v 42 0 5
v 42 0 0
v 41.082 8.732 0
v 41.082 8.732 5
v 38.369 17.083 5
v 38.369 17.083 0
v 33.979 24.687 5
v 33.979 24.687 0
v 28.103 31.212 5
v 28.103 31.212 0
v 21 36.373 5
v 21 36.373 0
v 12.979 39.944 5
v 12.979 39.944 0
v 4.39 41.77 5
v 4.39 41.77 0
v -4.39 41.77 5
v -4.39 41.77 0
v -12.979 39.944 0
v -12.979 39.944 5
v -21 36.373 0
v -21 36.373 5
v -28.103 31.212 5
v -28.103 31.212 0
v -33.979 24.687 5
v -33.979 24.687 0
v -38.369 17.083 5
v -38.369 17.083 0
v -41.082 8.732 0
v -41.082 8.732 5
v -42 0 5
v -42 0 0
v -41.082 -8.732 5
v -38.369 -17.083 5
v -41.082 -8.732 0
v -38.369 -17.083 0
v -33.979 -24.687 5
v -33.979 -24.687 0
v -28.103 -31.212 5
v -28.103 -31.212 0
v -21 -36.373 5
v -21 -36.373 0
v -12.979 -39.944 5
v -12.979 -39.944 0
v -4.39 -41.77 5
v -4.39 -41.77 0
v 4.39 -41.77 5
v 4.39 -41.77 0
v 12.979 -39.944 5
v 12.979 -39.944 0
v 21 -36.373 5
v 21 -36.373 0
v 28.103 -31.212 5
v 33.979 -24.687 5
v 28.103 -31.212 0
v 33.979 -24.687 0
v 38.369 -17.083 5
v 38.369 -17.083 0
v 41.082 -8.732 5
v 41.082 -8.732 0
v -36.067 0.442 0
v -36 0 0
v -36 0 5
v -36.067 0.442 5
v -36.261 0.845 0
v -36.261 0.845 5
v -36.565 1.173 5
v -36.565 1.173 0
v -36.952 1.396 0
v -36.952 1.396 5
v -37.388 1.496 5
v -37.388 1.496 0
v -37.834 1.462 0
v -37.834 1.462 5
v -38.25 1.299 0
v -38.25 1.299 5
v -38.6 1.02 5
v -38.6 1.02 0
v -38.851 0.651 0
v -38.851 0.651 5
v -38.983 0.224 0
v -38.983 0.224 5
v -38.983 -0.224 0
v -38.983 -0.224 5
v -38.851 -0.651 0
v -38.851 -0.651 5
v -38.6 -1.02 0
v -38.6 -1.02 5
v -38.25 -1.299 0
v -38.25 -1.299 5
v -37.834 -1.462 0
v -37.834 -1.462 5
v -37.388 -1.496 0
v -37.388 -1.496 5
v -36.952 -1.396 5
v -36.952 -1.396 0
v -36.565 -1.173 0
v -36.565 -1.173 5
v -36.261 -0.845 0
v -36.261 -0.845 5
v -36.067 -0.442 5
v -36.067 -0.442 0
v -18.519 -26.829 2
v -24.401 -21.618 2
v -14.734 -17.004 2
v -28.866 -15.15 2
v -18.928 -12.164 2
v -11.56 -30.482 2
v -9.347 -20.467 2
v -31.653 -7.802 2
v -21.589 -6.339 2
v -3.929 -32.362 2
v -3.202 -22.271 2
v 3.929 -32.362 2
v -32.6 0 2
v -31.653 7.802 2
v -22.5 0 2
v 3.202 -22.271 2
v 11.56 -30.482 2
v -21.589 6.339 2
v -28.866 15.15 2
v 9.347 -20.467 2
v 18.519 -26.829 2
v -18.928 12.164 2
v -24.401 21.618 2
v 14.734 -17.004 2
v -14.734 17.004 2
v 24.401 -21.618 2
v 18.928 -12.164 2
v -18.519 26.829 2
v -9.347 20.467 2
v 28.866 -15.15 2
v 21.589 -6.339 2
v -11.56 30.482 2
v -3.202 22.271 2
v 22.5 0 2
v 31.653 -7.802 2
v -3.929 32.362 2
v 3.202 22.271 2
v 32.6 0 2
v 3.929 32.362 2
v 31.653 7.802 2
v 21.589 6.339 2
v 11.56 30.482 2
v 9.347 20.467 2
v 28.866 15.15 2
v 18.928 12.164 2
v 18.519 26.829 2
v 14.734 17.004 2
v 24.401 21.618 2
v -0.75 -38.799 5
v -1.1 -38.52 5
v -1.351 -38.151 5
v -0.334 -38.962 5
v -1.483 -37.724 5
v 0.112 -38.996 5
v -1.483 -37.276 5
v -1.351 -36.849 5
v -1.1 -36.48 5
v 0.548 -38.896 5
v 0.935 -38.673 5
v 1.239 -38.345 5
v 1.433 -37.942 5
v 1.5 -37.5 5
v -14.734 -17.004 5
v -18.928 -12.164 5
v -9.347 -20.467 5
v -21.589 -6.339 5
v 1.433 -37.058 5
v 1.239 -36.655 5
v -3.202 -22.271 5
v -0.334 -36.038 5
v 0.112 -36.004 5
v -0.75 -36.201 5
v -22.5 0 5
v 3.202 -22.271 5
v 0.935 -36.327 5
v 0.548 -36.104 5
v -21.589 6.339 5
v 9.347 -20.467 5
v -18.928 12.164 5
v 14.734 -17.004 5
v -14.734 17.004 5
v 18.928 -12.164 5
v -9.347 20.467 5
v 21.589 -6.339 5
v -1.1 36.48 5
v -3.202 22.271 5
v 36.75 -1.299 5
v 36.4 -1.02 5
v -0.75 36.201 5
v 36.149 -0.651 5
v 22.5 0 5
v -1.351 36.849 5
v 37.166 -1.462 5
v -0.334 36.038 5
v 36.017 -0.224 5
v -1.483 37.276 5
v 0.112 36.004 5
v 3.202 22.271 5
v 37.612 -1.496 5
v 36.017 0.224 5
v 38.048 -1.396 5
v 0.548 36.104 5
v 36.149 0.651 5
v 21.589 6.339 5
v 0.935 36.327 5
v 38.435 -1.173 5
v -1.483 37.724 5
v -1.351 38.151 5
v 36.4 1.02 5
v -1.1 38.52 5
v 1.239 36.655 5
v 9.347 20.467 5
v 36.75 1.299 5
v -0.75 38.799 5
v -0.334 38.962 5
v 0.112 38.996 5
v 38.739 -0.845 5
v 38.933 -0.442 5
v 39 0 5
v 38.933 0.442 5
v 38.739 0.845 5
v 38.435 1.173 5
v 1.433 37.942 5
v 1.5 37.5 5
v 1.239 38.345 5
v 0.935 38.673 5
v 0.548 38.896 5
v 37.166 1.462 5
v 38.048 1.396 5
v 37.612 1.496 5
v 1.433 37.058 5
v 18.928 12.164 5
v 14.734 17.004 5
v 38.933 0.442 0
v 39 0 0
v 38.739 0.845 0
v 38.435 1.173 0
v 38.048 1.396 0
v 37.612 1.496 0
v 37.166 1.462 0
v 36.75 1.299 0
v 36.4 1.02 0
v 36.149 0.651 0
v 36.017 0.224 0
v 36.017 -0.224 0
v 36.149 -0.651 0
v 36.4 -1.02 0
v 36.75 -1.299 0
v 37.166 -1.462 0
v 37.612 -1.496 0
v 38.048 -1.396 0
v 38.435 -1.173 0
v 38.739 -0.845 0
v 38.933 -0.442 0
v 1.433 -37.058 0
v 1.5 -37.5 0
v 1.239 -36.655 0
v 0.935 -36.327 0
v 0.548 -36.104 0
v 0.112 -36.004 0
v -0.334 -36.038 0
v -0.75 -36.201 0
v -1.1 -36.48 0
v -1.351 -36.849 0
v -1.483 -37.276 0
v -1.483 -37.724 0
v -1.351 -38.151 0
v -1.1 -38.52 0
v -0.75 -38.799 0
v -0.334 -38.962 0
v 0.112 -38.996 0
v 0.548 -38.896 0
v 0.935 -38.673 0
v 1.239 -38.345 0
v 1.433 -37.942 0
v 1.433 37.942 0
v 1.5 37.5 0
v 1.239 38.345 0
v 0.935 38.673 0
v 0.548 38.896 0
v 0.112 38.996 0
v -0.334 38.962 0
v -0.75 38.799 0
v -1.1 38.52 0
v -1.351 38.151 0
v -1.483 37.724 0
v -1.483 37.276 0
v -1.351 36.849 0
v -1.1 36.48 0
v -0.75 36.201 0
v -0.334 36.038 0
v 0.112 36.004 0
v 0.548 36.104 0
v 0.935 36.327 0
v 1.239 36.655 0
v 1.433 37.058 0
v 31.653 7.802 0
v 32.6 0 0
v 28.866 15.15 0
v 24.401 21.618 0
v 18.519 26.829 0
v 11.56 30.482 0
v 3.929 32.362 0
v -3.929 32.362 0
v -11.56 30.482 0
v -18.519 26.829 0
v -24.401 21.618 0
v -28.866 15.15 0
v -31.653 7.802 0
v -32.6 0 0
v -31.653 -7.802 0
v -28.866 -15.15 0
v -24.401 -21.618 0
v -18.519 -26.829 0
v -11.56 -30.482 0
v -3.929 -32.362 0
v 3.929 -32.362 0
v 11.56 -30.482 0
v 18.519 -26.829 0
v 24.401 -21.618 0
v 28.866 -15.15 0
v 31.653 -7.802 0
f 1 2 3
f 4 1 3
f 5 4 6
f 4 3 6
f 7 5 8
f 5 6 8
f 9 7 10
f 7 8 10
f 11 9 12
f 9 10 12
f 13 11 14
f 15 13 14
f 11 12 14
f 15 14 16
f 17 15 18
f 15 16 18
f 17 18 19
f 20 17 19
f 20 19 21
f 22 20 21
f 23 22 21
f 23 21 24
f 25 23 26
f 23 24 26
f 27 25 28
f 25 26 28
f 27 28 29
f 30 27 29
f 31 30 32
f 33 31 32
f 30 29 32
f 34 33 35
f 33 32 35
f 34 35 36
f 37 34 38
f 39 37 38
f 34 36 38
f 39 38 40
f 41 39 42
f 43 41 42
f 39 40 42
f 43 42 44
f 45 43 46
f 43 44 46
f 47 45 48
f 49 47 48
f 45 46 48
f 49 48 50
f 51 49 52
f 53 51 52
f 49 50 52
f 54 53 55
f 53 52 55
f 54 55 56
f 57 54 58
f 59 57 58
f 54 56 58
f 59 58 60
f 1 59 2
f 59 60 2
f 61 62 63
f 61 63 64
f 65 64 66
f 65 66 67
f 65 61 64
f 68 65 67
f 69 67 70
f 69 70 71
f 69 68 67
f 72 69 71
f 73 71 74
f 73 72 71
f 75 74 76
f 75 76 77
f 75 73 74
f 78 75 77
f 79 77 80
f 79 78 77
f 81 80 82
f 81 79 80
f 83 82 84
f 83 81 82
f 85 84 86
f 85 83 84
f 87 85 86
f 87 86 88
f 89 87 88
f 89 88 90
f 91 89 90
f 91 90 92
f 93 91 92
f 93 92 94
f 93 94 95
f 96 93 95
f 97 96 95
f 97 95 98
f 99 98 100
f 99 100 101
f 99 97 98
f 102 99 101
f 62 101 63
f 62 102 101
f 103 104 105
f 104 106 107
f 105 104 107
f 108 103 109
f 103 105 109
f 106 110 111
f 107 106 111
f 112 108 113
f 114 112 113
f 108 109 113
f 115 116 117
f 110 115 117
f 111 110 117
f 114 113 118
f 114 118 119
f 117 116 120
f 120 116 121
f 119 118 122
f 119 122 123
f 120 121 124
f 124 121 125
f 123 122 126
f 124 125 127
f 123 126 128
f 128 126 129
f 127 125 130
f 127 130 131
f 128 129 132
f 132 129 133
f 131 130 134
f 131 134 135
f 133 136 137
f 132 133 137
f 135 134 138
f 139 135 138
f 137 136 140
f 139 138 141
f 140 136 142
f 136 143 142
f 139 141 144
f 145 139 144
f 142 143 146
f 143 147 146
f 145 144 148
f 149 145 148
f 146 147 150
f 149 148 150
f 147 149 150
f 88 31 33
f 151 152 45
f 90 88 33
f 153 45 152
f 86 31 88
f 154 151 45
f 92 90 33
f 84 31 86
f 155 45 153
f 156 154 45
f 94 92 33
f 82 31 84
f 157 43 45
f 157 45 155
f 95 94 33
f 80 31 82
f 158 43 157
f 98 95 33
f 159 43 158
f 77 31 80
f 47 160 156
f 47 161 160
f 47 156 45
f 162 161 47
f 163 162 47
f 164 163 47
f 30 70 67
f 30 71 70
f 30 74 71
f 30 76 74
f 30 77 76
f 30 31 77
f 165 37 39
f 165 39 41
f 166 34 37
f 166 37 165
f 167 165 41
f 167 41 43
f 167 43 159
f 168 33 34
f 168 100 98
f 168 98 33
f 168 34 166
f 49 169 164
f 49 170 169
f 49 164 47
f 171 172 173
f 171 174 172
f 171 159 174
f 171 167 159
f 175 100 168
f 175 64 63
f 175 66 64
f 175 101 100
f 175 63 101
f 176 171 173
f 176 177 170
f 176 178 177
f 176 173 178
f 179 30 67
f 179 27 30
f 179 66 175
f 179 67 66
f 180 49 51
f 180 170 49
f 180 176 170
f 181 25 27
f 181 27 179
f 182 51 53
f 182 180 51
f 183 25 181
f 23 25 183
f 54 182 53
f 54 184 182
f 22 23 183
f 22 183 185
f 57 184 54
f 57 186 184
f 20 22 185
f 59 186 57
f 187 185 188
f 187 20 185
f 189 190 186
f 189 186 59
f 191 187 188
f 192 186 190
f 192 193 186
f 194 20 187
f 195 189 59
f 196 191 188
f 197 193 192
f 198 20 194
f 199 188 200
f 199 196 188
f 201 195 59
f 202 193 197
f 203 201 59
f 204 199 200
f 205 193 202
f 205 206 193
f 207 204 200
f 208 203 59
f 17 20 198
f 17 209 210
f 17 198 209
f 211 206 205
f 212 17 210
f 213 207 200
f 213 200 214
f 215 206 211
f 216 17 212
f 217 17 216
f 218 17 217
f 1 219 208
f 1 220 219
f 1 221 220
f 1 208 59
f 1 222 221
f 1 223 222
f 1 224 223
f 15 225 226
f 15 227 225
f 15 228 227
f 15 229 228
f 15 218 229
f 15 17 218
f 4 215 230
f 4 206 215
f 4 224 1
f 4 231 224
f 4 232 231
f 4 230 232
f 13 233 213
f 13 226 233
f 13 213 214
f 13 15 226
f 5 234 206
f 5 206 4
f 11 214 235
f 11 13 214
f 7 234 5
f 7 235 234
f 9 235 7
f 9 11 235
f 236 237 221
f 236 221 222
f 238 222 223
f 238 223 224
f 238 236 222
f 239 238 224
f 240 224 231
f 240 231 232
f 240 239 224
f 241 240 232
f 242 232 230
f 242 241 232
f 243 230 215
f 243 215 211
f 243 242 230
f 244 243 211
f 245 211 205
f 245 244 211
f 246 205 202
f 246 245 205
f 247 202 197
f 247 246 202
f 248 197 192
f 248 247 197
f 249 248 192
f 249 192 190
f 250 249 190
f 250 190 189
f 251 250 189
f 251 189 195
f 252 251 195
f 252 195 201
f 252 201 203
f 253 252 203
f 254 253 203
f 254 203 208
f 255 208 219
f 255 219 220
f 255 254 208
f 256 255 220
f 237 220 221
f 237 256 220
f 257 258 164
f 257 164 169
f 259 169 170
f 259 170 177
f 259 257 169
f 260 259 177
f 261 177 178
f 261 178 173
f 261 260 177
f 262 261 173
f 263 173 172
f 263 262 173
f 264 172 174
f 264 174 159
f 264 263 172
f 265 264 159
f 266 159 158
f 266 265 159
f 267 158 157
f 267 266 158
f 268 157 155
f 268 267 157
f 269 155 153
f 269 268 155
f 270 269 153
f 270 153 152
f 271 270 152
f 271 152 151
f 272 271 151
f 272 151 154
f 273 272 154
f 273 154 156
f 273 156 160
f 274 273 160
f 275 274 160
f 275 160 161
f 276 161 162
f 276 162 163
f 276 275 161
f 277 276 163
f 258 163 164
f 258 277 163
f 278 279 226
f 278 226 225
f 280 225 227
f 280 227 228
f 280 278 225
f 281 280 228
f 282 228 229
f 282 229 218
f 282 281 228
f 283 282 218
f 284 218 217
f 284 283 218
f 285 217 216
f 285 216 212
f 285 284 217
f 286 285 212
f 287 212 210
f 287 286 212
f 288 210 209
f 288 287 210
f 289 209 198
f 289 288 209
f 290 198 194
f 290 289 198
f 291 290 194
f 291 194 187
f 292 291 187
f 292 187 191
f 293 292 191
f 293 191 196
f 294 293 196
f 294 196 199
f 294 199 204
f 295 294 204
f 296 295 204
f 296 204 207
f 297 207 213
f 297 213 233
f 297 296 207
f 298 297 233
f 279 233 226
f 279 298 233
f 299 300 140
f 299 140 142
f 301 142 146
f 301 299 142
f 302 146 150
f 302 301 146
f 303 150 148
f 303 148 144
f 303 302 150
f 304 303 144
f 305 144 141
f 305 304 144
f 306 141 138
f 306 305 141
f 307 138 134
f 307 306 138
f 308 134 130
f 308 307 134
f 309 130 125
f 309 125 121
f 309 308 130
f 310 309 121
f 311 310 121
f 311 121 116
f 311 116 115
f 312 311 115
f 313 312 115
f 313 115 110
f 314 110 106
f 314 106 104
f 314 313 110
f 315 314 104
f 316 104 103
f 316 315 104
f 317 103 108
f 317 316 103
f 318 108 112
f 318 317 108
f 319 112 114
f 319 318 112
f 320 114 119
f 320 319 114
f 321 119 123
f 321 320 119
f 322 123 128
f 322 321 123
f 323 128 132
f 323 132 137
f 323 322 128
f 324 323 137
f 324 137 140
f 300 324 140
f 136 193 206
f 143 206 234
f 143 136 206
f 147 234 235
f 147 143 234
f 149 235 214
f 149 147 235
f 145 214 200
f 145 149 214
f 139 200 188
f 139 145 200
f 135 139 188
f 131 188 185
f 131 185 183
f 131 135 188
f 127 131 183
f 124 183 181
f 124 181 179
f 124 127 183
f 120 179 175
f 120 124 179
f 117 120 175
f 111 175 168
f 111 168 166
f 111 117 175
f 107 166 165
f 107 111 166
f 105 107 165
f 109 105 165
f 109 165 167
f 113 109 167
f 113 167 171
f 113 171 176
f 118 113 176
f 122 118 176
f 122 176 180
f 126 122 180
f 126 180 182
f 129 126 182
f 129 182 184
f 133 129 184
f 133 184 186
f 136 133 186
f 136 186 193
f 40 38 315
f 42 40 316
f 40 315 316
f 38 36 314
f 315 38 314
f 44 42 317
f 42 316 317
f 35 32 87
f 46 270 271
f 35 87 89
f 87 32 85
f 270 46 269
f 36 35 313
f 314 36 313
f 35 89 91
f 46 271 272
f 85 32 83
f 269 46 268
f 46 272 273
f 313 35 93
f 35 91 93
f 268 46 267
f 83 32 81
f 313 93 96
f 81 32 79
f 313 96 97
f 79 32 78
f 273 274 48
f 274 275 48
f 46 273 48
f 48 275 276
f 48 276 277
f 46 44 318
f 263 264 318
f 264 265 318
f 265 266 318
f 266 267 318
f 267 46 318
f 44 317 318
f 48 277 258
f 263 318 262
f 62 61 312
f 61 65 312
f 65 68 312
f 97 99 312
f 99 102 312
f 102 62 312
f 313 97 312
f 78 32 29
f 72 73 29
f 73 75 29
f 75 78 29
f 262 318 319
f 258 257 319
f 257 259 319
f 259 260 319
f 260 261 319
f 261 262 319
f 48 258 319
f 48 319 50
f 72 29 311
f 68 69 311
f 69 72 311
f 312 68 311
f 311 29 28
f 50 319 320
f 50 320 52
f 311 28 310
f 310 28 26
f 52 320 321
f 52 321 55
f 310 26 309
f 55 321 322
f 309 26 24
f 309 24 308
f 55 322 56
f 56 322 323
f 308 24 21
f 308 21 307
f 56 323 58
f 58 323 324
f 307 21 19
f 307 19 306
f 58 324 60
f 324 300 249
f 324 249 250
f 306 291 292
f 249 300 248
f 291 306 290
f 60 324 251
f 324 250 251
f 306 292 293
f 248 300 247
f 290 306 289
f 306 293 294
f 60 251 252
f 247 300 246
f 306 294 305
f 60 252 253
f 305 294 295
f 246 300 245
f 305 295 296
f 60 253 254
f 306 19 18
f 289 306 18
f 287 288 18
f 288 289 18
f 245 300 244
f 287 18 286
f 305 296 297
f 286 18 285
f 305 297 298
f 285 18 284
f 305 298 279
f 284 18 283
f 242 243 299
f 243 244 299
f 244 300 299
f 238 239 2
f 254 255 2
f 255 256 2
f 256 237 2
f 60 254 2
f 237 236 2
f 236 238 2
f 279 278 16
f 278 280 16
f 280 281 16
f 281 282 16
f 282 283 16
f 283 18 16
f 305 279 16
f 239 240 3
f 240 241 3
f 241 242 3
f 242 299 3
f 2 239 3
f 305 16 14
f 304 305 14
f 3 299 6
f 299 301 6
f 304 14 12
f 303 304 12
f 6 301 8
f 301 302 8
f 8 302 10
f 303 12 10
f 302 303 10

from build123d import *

# Parameters (mm, degrees)
SKETCH_1_R          = 42
SKETCH_1_R_2        = 1.5
SKETCH_1_R_3        = 32.6
SKETCH_1_R_4        = 22.5
EXTRUDE_1_DEPTH     = 5
SKETCH_1_4_R        = 32.6
CUT_EXTRUDE_1_DEPTH = 2


with BuildPart() as part:
    # 草图1 → 凸台-拉伸1 (new body)
    # profile 1 of 2: a face of its own
    with BuildSketch(Plane.XY):
        Circle(SKETCH_1_R)
        with Locations((0, -37.5)):
            Circle(SKETCH_1_R_2, mode=Mode.SUBTRACT)
        Circle(SKETCH_1_R_3, mode=Mode.SUBTRACT)
        with Locations((37.5, 0)):
            Circle(SKETCH_1_R_2, mode=Mode.SUBTRACT)
        with Locations((-37.5, 0)):
            Circle(SKETCH_1_R_2, mode=Mode.SUBTRACT)
        with Locations((0, 37.5)):
            Circle(SKETCH_1_R_2, mode=Mode.SUBTRACT)
    # profile 2 of 2: a face of its own
    with BuildSketch(Plane.XY):
        Circle(SKETCH_1_R_3)
        Circle(SKETCH_1_R_4, mode=Mode.SUBTRACT)
    extrude(amount=EXTRUDE_1_DEPTH)

    # 草图1<4> → 切除-拉伸1 (cut)
    with BuildSketch(Plane.XY):
        Circle(SKETCH_1_4_R)
    extrude(amount=CUT_EXTRUDE_1_DEPTH, mode=Mode.SUBTRACT)


solid = part.part
